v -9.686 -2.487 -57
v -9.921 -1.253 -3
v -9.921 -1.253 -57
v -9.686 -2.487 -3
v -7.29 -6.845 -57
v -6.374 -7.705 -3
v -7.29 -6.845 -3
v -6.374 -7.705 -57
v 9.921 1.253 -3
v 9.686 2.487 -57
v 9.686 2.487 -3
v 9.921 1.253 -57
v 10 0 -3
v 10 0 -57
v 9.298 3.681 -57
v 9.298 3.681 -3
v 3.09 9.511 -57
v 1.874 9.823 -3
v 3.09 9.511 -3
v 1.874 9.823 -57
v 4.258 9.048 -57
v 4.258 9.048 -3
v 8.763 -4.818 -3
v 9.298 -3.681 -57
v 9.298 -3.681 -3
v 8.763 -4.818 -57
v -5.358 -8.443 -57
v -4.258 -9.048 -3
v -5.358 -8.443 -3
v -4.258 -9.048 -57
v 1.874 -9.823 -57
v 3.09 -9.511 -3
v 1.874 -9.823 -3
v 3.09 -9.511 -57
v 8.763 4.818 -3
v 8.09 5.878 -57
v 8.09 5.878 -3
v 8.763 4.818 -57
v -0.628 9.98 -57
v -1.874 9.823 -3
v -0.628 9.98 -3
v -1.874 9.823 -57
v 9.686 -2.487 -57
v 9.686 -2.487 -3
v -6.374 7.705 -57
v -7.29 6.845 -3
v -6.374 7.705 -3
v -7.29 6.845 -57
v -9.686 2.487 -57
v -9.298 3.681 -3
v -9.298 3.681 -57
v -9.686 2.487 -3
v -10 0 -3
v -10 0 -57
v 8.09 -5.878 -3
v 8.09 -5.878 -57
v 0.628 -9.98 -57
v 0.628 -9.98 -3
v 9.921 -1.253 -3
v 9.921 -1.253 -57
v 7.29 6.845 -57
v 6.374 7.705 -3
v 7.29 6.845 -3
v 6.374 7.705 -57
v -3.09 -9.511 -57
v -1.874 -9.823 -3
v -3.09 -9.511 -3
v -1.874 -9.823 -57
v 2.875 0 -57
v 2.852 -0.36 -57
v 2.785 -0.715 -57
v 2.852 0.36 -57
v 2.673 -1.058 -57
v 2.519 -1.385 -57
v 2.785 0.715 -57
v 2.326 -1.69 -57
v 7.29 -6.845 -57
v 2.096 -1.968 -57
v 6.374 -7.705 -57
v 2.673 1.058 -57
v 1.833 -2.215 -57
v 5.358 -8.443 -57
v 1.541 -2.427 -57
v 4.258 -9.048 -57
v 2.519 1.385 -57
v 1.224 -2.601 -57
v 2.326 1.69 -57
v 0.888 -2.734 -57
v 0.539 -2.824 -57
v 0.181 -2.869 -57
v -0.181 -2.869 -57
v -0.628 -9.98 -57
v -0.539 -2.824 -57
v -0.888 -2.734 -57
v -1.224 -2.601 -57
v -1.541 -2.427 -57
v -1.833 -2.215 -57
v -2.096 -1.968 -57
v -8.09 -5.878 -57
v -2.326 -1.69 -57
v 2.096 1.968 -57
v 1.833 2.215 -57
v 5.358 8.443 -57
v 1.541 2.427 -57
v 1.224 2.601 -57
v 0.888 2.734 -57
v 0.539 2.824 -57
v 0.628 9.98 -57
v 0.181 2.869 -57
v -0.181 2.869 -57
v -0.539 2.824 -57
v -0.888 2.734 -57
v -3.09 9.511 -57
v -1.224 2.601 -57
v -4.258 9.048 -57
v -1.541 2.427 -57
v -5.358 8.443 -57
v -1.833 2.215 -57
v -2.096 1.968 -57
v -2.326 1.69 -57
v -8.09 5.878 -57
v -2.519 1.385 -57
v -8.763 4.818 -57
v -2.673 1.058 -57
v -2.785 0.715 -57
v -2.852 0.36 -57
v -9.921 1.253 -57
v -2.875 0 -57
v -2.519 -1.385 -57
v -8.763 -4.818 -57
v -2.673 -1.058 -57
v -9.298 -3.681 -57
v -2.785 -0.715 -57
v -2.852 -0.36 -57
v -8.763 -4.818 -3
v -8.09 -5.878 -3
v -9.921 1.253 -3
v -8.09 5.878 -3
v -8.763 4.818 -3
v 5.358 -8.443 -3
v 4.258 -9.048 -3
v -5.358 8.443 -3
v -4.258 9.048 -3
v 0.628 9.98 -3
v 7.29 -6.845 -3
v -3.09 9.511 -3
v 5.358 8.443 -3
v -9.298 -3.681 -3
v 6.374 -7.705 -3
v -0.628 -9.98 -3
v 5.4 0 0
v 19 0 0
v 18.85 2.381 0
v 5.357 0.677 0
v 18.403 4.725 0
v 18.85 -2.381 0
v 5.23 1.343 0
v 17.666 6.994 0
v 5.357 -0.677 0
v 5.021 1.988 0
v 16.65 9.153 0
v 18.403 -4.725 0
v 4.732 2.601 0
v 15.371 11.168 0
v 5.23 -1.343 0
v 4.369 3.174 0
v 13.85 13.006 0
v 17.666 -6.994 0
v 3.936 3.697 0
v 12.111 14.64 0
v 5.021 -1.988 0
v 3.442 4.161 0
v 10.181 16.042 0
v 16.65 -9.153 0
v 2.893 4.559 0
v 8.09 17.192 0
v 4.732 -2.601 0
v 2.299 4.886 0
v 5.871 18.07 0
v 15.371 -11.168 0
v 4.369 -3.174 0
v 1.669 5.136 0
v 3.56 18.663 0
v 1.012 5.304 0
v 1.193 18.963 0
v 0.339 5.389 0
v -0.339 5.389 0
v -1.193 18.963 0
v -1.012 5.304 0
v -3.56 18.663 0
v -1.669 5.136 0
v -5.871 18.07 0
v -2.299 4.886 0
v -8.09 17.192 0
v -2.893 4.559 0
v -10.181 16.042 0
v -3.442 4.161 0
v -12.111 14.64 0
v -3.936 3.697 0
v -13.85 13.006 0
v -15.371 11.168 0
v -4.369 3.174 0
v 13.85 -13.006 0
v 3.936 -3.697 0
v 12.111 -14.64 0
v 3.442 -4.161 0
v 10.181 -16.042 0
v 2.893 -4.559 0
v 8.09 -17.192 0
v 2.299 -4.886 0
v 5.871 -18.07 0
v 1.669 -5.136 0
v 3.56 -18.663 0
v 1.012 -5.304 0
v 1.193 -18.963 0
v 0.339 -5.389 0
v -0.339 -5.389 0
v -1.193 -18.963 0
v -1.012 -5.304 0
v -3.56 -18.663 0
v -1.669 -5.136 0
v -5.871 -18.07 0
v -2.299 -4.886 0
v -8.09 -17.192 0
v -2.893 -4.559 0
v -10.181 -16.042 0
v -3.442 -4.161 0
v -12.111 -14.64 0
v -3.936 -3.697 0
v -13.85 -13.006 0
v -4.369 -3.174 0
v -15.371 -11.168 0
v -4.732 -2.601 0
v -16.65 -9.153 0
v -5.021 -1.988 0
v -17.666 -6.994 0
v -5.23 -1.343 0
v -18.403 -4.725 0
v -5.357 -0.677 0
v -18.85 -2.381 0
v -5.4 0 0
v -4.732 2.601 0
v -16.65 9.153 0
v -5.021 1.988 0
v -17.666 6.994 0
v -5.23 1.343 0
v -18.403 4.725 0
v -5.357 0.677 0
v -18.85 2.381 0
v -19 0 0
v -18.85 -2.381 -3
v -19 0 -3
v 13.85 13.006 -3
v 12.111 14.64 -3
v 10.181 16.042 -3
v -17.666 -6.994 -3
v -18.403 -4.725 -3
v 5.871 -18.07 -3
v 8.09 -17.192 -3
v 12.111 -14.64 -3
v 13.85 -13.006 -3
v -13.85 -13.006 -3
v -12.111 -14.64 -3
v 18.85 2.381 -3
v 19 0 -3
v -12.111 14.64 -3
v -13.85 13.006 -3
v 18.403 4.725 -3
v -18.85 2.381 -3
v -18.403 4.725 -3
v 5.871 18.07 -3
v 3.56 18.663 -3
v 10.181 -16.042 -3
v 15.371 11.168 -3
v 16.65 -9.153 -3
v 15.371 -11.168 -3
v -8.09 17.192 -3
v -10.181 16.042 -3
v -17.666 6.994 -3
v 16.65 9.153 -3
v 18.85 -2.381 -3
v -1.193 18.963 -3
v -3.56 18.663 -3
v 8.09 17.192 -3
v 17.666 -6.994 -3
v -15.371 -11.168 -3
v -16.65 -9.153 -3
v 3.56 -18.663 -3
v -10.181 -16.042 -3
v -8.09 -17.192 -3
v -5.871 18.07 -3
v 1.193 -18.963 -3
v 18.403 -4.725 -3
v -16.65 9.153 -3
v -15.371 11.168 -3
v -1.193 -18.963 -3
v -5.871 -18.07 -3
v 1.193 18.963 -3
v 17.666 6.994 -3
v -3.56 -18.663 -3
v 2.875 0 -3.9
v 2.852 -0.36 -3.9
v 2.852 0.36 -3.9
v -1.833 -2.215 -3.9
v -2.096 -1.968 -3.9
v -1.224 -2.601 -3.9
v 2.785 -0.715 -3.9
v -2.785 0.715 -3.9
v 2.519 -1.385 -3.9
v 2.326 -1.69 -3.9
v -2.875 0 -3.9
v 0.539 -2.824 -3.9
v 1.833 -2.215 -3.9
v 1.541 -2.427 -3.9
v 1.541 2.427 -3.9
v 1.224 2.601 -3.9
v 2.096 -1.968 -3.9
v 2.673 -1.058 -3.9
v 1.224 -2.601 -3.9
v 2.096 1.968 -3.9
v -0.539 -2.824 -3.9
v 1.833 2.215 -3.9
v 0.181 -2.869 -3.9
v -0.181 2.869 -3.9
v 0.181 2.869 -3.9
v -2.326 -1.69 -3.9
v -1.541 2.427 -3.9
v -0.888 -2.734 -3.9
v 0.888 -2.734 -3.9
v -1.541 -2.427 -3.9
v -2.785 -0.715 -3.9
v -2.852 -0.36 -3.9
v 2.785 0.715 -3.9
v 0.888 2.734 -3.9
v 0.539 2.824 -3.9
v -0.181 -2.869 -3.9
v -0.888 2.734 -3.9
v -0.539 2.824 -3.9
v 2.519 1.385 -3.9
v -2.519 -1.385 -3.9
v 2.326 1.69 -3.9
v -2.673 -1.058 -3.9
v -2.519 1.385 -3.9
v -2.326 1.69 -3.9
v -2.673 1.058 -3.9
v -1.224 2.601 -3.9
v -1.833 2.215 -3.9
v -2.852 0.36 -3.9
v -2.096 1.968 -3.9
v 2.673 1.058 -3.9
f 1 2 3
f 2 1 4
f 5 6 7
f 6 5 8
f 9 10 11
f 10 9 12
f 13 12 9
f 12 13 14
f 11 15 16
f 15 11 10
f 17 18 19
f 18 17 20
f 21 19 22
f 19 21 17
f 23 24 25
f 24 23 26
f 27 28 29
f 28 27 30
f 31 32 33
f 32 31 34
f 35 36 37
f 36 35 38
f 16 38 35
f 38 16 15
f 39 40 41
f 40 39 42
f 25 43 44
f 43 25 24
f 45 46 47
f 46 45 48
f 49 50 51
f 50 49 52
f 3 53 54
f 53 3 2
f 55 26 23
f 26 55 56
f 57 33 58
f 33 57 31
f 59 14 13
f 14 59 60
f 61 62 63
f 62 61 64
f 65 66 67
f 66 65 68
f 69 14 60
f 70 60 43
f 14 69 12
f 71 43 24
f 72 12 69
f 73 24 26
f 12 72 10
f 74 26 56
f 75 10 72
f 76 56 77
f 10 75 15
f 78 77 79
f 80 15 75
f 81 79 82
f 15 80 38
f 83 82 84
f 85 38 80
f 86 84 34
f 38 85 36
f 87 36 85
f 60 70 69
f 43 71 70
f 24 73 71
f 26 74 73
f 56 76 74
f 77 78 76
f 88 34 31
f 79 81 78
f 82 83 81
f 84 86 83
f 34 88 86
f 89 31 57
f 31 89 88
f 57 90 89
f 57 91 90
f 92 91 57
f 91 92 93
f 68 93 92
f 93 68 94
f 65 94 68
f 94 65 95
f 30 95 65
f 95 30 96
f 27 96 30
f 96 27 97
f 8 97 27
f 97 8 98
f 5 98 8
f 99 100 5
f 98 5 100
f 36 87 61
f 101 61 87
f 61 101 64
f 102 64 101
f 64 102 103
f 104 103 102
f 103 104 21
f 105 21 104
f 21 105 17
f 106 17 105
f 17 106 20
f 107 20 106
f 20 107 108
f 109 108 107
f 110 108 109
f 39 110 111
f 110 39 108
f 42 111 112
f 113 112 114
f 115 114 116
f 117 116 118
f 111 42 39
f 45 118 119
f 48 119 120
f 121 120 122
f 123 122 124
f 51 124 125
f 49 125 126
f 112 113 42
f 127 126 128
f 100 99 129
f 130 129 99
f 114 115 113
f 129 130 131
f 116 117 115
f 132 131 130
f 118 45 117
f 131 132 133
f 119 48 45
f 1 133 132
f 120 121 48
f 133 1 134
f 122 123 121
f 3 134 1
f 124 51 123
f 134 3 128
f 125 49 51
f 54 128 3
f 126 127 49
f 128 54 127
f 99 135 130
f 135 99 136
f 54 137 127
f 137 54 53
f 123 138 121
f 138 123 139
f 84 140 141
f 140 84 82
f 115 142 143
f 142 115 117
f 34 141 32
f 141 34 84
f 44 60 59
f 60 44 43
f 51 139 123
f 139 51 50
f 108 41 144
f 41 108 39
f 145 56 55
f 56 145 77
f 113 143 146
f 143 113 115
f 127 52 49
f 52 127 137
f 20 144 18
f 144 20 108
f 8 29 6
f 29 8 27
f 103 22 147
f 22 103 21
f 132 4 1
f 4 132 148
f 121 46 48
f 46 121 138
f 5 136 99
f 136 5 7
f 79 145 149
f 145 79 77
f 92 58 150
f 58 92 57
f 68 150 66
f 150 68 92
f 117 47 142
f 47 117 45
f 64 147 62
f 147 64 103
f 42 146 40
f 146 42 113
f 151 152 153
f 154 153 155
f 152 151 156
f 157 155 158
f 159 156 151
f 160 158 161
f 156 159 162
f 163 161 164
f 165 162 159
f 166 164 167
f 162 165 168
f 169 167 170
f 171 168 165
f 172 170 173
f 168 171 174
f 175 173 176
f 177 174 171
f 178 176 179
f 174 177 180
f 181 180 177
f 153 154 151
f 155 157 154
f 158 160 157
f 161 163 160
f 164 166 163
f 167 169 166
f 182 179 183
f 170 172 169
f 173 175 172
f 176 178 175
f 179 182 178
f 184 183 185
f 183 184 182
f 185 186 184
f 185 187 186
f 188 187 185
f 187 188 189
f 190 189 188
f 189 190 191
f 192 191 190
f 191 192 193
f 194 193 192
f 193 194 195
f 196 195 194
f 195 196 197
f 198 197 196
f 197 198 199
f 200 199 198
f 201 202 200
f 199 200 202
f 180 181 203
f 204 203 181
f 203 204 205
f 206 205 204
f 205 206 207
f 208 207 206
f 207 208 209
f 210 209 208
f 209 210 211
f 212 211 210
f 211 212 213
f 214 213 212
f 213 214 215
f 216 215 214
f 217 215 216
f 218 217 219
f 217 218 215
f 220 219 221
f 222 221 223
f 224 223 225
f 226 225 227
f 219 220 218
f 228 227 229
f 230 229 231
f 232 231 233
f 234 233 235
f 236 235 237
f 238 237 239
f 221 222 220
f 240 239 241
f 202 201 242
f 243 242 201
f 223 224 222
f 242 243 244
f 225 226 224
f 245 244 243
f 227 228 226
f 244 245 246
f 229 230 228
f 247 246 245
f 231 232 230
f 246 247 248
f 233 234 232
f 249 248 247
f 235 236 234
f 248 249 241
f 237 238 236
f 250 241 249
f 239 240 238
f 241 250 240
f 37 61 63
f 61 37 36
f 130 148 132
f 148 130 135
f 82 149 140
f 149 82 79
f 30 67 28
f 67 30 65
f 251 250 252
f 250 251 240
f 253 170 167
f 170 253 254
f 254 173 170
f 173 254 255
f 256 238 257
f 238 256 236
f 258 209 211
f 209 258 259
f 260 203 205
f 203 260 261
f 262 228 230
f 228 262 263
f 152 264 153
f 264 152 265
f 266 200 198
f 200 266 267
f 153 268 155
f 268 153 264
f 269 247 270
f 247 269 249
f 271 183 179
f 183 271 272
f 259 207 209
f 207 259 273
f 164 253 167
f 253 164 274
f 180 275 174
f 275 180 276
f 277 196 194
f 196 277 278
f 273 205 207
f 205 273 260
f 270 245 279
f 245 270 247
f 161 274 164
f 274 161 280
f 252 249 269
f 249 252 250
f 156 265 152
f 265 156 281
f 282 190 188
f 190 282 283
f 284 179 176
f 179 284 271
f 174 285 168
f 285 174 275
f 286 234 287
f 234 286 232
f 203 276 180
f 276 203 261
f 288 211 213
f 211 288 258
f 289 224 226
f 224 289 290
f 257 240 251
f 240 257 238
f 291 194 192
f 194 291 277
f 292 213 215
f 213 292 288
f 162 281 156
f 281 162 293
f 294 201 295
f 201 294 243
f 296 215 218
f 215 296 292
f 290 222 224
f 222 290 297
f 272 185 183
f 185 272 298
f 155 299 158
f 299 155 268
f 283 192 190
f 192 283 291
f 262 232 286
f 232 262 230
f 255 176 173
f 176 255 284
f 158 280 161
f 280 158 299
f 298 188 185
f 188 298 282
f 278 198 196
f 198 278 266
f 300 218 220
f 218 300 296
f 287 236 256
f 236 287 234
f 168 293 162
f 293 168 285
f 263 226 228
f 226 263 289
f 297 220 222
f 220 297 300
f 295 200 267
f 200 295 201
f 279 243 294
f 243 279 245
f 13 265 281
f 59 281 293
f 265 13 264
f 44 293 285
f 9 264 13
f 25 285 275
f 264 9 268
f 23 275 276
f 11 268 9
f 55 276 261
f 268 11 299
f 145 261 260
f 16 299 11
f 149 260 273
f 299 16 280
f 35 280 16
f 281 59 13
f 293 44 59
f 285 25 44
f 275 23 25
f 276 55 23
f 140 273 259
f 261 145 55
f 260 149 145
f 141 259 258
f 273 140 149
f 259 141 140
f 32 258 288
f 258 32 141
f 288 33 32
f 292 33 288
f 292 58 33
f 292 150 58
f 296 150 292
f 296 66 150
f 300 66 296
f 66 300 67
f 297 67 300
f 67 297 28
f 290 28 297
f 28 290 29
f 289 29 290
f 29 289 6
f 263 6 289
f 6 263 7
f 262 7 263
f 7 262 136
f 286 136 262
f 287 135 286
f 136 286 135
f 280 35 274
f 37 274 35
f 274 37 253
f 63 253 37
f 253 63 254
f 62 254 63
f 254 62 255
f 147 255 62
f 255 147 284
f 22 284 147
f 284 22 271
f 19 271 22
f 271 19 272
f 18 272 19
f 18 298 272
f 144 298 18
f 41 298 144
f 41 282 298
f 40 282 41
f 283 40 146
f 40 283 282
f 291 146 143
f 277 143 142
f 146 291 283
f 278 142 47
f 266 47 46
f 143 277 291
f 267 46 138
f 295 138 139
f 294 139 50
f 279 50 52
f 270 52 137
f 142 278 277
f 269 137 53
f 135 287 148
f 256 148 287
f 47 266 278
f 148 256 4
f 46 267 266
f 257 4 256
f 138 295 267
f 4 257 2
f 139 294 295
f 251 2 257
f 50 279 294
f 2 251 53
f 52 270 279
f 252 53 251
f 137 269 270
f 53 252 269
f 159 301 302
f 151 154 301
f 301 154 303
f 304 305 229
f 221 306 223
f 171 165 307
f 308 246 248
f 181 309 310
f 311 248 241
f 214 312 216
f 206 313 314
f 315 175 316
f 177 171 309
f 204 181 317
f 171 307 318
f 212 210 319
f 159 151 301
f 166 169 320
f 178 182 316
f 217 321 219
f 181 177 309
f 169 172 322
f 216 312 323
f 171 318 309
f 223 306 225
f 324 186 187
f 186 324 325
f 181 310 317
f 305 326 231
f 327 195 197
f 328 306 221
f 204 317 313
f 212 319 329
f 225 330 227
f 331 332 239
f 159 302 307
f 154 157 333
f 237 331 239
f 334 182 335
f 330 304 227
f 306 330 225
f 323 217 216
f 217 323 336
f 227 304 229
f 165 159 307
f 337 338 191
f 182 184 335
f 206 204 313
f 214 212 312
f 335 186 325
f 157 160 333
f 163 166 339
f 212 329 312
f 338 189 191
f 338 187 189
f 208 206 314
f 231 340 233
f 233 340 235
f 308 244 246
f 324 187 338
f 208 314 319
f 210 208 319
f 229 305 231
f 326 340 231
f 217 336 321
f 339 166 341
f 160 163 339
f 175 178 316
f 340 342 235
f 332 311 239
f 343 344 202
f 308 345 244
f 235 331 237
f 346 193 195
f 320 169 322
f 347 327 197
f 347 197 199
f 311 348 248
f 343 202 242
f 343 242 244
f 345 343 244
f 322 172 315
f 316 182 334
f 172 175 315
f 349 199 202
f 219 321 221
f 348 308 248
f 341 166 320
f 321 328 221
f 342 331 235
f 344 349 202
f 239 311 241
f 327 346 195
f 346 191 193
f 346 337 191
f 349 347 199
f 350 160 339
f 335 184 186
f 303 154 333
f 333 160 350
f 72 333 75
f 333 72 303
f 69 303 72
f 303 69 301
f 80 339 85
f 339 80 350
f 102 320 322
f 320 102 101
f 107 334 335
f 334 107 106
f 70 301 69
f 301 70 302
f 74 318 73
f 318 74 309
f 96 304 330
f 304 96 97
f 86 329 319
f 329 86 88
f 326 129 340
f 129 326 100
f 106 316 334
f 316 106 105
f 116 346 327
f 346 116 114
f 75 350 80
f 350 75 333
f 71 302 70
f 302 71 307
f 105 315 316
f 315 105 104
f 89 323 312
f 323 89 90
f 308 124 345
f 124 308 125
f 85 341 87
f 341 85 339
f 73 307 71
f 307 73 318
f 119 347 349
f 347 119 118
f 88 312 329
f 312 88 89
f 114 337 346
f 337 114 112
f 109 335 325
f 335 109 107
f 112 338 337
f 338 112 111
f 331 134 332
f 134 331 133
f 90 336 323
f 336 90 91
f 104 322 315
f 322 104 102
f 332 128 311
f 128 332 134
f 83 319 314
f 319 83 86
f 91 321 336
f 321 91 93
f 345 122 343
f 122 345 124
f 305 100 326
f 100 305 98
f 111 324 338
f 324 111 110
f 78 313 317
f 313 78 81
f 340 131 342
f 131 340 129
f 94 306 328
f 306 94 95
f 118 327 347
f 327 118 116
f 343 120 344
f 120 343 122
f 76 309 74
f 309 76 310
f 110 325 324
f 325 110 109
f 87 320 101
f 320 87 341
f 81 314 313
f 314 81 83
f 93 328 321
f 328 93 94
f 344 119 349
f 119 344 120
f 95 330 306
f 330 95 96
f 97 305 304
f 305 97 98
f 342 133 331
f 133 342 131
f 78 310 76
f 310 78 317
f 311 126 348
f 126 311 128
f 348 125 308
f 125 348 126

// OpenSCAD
$fn = 50;


difference() {
	union() {
		translate(v = [0, 0, -57.0000000000]) {
			cylinder(h = 57, r = 10.0000000000);
		}
		translate(v = [0, 0, -3.0000000000]) {
			cylinder(h = 3, r = 19.0000000000);
		}
	}
	union() {
		translate(v = [0, 0, 0]) {
			rotate(a = [0, 0, 0]) {
				difference() {
					union() {
						#translate(v = [0, 0, -57.0000000000]) {
							cylinder(h = 57, r = 2.6000000000);
						}
						#translate(v = [0, 0, -3.9000000000]) {
							cylinder(h = 3.9000000000, r1 = 2.8750000000, r2 = 5.4000000000);
						}
						#translate(v = [0, 0, -57.0000000000]) {
							cylinder(h = 57, r = 2.8750000000);
						}
						#translate(v = [0, 0, -57.0000000000]) {
							cylinder(h = 57, r = 2.6000000000);
						}
					}
					union();
				}
			}
		}
	}
}
